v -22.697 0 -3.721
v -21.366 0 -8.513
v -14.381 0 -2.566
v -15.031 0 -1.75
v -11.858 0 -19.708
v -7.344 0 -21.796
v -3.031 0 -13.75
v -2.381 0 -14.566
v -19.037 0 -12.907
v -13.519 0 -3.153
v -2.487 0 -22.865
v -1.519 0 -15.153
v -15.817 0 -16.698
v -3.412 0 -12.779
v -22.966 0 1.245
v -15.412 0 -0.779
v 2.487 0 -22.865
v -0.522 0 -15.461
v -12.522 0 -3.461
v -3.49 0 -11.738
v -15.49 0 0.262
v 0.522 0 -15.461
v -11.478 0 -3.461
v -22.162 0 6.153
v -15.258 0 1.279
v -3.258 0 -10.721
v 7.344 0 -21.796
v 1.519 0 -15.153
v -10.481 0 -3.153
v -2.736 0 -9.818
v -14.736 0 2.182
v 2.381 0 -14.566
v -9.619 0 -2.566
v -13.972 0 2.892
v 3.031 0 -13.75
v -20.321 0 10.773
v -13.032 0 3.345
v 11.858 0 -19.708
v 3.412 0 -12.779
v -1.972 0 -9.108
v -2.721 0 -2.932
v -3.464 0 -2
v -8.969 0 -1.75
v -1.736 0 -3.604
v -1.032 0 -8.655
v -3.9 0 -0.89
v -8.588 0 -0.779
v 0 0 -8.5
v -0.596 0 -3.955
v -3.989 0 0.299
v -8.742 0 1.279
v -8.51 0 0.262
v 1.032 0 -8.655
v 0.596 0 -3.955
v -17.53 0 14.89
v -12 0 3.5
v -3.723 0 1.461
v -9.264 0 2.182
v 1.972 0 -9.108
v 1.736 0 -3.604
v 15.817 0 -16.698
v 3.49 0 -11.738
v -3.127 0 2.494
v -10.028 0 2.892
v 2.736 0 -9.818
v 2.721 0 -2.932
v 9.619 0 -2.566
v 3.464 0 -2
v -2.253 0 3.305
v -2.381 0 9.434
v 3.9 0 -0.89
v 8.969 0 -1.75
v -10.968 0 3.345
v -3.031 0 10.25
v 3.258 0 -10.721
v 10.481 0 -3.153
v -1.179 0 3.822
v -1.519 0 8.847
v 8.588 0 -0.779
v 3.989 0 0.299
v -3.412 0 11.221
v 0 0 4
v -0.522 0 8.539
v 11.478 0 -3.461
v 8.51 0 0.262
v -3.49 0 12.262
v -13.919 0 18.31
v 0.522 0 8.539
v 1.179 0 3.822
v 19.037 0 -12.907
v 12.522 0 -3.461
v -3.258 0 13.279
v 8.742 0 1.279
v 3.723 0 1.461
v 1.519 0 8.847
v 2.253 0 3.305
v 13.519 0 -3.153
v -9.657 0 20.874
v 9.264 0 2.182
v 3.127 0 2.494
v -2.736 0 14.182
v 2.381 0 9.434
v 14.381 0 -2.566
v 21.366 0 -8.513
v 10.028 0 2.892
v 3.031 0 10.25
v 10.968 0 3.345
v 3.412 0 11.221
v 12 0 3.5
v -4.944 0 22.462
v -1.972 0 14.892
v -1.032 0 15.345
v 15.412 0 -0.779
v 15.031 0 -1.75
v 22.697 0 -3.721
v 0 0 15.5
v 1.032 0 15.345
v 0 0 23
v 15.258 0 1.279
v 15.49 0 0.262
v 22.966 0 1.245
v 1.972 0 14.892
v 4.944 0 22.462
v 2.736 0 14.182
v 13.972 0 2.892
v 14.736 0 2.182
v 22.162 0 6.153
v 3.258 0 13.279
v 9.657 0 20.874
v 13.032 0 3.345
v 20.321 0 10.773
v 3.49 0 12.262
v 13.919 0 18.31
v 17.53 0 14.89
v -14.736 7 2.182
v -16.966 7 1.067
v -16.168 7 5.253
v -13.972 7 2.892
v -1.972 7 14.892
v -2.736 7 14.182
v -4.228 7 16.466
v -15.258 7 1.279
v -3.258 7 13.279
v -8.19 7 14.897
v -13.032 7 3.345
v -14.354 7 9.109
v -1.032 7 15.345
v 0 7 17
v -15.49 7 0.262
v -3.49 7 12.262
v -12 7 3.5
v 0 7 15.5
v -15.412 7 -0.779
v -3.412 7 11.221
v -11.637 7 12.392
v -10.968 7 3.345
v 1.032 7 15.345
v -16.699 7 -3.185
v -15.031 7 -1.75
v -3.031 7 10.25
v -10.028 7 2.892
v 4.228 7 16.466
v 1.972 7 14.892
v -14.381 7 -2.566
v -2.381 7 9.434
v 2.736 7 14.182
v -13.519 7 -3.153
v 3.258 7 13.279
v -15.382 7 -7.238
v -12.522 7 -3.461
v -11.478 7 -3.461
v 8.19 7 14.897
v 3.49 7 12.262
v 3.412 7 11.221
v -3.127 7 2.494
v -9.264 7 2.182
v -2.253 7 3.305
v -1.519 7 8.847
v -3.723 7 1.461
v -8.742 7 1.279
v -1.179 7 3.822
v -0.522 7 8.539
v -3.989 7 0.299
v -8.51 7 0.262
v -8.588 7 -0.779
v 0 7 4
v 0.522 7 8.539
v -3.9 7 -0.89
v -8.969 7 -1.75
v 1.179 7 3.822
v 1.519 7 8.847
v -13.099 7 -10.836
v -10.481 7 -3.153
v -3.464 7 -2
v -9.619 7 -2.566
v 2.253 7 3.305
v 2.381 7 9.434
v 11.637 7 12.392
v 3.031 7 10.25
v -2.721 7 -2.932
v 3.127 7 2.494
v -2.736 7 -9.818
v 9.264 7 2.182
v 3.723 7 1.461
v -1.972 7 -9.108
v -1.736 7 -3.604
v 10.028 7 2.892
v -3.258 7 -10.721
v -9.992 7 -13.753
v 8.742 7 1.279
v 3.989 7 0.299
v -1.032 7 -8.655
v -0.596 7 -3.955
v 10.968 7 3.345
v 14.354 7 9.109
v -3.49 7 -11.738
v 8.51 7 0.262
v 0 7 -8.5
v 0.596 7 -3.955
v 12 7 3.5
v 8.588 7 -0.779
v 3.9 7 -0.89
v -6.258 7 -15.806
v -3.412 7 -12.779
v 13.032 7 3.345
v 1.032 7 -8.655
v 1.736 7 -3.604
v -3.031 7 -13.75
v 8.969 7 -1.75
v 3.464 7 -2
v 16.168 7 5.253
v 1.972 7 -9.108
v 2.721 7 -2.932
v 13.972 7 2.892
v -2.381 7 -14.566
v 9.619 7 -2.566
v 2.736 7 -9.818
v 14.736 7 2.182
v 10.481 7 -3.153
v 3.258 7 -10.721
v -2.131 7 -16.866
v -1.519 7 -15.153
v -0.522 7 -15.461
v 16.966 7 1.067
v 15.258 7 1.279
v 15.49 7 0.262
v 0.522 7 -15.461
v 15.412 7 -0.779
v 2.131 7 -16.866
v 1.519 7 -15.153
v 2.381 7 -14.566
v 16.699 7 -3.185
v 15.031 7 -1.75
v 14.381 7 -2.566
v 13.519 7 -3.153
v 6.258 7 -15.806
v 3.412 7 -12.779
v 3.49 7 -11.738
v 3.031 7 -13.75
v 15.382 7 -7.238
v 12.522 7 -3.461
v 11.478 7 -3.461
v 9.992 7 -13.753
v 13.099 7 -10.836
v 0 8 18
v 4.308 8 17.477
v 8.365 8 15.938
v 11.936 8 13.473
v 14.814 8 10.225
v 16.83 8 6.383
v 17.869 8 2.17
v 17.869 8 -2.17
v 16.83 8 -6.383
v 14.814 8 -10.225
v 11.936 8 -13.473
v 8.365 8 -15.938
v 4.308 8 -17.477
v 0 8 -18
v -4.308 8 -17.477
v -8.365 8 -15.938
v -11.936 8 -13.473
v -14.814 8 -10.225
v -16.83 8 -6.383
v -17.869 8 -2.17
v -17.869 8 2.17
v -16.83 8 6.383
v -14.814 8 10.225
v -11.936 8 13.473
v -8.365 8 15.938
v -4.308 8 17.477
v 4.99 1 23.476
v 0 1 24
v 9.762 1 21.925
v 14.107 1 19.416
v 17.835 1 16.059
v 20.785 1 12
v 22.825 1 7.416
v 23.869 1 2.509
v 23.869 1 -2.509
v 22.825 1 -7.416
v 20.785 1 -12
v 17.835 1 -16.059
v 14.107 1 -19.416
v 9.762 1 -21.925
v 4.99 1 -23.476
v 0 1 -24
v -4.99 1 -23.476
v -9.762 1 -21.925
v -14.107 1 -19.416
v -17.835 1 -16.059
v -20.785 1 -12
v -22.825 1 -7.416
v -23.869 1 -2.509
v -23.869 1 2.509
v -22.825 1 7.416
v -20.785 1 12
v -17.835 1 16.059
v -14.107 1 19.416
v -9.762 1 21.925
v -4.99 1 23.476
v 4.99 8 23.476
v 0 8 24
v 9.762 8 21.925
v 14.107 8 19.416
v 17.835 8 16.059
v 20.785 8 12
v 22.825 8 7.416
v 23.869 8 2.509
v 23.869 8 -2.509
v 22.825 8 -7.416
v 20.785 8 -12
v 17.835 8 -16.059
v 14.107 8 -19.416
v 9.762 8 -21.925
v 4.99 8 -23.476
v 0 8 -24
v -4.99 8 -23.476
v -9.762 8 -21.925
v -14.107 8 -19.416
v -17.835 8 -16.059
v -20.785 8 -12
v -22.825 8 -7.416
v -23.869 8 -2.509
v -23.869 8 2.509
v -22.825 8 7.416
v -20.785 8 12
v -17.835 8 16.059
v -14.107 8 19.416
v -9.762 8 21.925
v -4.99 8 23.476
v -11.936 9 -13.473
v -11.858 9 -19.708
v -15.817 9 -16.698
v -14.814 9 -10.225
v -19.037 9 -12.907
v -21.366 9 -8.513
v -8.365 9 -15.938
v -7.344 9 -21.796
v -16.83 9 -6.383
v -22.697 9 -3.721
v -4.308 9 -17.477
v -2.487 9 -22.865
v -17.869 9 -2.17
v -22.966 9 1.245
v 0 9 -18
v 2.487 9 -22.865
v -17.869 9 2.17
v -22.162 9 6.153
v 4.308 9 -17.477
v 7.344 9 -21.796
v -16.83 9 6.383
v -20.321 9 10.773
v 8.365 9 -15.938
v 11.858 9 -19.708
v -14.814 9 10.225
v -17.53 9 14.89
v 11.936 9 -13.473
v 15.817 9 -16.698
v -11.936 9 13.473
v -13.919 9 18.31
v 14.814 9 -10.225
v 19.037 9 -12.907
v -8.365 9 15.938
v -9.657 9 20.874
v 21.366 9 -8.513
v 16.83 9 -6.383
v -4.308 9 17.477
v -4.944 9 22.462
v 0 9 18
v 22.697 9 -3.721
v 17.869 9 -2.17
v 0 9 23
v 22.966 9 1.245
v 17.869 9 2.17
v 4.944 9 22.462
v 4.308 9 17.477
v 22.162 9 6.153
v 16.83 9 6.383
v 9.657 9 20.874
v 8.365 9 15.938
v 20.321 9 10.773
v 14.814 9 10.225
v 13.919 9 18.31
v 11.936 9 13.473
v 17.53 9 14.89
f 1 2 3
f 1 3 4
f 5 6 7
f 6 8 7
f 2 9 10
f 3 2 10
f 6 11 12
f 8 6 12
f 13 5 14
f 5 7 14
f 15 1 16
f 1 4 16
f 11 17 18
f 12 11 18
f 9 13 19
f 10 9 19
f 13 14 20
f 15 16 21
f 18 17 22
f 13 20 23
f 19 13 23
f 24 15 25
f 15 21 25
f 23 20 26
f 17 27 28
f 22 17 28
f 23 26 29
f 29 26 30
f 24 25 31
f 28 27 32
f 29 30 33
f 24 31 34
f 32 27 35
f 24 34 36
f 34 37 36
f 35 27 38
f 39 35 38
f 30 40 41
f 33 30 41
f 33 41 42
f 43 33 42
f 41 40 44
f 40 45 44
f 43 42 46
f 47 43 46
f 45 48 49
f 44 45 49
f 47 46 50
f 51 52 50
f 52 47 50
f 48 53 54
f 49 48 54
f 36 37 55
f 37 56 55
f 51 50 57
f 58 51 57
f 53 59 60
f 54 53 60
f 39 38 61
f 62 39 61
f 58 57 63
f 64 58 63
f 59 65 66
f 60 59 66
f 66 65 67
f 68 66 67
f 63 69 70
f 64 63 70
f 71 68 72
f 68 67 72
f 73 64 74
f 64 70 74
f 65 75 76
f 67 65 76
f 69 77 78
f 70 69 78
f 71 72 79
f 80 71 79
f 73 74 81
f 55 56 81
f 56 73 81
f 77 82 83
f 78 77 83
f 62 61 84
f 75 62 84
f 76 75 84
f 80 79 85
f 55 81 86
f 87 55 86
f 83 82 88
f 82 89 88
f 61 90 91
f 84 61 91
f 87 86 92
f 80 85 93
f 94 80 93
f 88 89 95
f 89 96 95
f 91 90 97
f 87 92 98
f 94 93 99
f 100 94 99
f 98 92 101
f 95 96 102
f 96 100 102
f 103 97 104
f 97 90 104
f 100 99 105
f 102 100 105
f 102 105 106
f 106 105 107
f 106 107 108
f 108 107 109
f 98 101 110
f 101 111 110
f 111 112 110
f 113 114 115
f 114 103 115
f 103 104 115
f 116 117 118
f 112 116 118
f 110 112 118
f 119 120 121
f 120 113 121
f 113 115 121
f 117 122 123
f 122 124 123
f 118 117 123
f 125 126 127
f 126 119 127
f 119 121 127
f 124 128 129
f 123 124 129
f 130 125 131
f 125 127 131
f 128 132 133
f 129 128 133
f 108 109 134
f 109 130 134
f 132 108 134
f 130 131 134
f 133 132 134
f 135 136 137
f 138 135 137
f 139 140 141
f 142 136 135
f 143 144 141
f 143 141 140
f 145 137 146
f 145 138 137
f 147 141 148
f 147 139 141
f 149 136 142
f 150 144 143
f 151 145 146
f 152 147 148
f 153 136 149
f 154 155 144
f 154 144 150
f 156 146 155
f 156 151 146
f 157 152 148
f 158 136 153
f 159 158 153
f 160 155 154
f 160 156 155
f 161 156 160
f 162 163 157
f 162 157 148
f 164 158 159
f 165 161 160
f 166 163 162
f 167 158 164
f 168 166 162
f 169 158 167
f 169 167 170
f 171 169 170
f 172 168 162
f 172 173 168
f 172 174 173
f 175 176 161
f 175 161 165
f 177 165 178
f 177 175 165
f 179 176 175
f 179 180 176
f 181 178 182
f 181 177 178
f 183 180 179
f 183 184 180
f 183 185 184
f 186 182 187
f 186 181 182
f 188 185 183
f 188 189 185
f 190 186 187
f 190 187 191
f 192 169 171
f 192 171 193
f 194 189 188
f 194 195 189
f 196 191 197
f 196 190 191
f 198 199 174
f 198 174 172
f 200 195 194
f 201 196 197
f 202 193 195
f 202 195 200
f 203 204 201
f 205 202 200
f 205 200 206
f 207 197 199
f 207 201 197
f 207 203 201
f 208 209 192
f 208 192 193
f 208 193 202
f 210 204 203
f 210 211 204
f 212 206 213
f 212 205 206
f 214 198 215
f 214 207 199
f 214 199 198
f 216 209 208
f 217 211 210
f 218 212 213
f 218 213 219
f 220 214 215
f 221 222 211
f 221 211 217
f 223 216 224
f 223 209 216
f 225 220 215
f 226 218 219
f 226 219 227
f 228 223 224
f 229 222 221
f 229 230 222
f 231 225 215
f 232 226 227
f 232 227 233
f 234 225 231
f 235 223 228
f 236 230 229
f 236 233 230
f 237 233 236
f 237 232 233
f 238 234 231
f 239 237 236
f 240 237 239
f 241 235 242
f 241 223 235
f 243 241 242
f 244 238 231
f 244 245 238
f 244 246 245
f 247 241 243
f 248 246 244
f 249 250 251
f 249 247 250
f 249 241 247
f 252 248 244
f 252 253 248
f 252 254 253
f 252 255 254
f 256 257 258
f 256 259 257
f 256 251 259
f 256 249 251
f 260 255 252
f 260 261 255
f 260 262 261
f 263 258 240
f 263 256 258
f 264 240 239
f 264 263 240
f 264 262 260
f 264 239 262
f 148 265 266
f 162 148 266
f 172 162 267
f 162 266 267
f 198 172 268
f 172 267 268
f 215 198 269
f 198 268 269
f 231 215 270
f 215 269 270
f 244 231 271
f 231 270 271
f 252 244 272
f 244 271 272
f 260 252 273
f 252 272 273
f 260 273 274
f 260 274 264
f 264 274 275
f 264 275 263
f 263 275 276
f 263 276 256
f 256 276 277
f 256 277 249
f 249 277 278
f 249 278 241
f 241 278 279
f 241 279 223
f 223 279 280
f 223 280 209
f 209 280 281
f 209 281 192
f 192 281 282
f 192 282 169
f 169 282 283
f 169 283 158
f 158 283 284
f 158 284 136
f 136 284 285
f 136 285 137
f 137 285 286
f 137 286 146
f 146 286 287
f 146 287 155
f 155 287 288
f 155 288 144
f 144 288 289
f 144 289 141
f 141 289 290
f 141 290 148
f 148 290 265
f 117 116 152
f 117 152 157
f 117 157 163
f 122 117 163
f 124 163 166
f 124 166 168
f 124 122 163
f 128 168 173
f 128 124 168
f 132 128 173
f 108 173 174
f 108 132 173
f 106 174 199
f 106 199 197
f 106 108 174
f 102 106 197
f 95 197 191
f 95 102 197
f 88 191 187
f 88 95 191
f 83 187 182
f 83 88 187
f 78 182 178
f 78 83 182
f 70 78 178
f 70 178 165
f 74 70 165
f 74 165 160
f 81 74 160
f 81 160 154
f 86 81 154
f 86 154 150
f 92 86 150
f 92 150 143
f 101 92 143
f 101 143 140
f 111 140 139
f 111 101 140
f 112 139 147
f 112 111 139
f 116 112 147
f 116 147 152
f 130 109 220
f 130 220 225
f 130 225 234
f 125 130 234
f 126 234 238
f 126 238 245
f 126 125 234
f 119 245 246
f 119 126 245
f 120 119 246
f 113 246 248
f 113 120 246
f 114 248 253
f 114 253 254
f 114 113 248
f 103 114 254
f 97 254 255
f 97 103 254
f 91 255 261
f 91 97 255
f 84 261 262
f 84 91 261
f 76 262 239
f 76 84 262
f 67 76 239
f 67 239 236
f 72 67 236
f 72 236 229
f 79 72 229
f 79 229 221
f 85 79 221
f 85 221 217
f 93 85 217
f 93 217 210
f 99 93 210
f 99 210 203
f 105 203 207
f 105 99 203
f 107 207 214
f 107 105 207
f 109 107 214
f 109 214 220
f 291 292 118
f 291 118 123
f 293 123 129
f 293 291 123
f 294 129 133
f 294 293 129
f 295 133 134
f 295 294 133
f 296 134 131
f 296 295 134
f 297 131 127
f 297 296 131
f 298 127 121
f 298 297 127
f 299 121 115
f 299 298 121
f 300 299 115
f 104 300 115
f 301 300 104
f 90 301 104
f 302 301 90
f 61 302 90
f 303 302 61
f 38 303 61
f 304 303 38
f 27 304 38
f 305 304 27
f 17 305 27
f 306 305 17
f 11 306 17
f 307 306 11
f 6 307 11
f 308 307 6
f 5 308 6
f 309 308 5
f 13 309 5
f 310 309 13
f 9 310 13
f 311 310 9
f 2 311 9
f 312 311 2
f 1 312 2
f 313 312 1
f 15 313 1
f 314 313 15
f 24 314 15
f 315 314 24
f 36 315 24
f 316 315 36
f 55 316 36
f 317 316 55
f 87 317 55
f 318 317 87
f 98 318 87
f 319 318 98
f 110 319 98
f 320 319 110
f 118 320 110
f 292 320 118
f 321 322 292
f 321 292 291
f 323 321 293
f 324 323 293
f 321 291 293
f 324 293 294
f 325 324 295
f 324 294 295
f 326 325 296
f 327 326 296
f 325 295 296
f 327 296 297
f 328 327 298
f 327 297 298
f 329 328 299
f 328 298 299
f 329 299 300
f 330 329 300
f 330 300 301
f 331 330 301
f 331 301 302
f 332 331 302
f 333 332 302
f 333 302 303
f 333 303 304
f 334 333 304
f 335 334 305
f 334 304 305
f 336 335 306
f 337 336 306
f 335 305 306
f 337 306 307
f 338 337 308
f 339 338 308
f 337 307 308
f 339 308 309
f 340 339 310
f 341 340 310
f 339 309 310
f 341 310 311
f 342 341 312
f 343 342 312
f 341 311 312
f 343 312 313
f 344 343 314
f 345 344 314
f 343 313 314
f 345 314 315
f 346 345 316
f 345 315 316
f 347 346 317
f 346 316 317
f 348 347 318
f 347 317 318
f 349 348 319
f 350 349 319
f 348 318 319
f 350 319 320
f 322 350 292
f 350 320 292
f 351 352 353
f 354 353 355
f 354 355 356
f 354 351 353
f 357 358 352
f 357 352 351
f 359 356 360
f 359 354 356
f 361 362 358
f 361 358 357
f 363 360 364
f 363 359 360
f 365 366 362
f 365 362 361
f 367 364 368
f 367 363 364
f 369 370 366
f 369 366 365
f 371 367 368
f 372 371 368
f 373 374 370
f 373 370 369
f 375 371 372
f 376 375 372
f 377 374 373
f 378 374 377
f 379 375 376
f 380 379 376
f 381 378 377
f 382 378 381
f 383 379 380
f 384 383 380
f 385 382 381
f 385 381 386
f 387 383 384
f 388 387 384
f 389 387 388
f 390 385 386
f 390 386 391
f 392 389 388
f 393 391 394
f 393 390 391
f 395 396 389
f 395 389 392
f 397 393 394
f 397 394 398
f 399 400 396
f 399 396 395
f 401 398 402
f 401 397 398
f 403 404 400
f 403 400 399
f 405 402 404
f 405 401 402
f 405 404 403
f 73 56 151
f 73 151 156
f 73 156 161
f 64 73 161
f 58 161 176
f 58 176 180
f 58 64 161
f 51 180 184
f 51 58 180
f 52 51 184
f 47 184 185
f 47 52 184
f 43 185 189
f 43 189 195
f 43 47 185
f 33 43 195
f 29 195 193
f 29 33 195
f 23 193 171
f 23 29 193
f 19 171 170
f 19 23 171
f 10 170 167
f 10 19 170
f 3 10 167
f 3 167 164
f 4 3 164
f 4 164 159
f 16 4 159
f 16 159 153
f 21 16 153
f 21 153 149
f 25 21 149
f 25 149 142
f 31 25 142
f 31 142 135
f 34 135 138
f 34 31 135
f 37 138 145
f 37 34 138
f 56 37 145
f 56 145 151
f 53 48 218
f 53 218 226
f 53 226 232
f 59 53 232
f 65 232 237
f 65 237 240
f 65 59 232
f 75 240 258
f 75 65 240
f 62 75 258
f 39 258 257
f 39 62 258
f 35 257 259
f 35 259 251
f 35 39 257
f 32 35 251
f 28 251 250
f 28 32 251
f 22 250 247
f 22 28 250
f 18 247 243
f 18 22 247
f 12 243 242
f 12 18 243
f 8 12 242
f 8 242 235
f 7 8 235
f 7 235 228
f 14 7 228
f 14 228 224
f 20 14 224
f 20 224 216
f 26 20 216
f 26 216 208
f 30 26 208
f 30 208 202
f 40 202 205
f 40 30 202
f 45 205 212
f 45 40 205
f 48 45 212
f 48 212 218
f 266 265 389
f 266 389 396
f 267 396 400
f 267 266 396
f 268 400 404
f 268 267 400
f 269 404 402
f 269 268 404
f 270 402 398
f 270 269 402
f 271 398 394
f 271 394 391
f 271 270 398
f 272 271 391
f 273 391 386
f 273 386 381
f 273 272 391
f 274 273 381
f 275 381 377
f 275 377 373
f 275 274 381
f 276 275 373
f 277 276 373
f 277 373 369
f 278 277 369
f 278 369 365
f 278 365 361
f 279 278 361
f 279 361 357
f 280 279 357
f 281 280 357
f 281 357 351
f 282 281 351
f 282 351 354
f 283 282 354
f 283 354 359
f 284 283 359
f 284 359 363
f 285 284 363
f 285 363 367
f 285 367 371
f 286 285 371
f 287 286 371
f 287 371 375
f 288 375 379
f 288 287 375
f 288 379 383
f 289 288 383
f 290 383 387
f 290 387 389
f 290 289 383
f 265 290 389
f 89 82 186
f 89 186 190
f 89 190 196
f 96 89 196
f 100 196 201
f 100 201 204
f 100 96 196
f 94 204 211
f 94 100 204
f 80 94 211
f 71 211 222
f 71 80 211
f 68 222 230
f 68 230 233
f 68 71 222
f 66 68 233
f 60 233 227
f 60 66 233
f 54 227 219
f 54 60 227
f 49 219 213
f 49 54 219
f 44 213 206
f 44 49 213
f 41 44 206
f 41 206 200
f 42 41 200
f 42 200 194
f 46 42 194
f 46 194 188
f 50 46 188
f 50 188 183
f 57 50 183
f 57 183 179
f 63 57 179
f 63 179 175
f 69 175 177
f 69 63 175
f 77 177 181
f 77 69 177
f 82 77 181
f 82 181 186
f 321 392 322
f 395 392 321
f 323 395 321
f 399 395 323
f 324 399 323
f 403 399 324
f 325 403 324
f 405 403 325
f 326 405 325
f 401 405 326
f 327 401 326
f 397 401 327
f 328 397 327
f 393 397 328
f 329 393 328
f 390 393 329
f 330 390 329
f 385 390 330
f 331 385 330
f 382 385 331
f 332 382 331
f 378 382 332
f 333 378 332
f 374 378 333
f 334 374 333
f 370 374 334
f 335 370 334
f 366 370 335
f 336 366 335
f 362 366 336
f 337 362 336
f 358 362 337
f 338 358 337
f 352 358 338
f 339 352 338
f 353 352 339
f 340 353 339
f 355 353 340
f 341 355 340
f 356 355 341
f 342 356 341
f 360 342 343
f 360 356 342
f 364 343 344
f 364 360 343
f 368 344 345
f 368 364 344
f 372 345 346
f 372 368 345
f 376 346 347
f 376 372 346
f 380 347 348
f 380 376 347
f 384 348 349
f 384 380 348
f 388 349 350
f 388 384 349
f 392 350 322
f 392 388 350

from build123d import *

# Parameters (mm, degrees)
SKETCH2_R           = 24
SKETCH2_R_2         = 18
BOSS_EXTRUDE2_DEPTH = 9
SKETCH2_3_R         = 18
SKETCH2_3_R_2       = 3.5
SKETCH2_3_R_3       = 4
BOSS_EXTRUDE3_DEPTH = 7
CHAMFER1_SIZE       = 1
CHAMFER3_SIZE       = 1


with BuildPart() as part:
    # Sketch2 → Boss-Extrude2 (new body)
    with BuildSketch(Plane(origin=(0, 0, 0), x_dir=(1, 0, 0), z_dir=(0, 1, 0))):
        Circle(SKETCH2_R)
        Circle(SKETCH2_R_2, mode=Mode.SUBTRACT)
    extrude(amount=BOSS_EXTRUDE2_DEPTH)

    # Sketch2<3> → Boss-Extrude3 (add)
    with BuildSketch(Plane(origin=(0, 0, 0), x_dir=(1, 0, 0), z_dir=(0, 1, 0))):
        Circle(SKETCH2_3_R)
        with Locations((-12, 0)):
            Circle(SKETCH2_3_R_2, mode=Mode.SUBTRACT)
        with Locations((0, -12)):
            Circle(SKETCH2_3_R_2, mode=Mode.SUBTRACT)
        with Locations((12, 0)):
            Circle(SKETCH2_3_R_2, mode=Mode.SUBTRACT)
        Circle(SKETCH2_3_R_3, mode=Mode.SUBTRACT)
        with Locations((0, 12)):
            Circle(SKETCH2_3_R_2, mode=Mode.SUBTRACT)
    extrude(amount=BOSS_EXTRUDE3_DEPTH)

    # Chamfer1
    chamfer1_edges = [part.edges().sort_by_distance(p)[0] for p in [
        (-24, 0, 0),
        (-24, 9, 0),
    ]]
    chamfer(chamfer1_edges, length=CHAMFER1_SIZE)

    # Chamfer3
    chamfer3_edges = [part.edges().sort_by_distance(p)[0] for p in [
        (-18, 7, 0),
    ]]
    chamfer(chamfer3_edges, length=CHAMFER3_SIZE)


solid = part.part
